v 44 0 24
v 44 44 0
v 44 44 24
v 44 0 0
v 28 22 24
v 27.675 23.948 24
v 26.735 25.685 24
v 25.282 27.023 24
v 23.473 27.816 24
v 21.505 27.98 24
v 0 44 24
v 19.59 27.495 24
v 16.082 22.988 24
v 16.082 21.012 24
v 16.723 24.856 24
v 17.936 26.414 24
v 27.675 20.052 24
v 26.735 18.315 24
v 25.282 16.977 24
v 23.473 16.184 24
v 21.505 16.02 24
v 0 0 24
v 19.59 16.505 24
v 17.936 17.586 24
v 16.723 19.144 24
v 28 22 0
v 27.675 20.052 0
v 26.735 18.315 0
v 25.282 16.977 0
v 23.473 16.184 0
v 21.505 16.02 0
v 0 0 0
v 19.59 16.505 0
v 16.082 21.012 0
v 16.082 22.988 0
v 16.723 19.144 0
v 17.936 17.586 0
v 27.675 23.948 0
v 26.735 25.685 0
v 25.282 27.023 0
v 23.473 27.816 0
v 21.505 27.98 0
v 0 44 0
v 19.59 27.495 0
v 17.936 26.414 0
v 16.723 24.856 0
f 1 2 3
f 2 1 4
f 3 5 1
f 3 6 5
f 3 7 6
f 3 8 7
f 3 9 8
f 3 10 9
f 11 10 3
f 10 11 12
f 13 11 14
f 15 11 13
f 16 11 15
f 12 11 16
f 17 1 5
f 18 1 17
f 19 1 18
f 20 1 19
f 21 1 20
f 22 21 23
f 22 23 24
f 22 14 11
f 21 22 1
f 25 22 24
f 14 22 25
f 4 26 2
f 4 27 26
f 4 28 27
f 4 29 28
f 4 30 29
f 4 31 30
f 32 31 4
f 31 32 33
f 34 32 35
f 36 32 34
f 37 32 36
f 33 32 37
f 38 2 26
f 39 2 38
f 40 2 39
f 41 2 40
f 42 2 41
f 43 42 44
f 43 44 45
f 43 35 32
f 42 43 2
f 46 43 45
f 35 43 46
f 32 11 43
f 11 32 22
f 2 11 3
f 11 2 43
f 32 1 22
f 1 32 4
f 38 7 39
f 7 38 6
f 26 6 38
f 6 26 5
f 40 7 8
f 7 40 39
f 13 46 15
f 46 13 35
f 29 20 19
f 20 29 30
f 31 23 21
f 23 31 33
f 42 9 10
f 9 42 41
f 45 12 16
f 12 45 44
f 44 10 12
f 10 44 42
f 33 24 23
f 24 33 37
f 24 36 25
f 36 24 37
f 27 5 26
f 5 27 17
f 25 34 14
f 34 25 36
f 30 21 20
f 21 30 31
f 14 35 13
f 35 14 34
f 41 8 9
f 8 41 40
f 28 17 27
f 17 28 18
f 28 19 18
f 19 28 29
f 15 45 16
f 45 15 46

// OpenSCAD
// % and * subtrees stay out of the output; a module made only of them is empty
module motor_dummy() {
    translate([-22, -22, -5]) %cube([44, 44, 5]);
    translate([18, 18, -5]) %cylinder(r = 2, h = 24);
}
module bracket() {
    difference() {
        cube([44, 44, 24]);
        translate([22, 22, -1]) cylinder(r = 6, h = 26);
    }
    *translate([0, 0, 30]) cube(10);
    motor_dummy();
}
bracket();
%translate([60, 0, 0]) sphere(10);
